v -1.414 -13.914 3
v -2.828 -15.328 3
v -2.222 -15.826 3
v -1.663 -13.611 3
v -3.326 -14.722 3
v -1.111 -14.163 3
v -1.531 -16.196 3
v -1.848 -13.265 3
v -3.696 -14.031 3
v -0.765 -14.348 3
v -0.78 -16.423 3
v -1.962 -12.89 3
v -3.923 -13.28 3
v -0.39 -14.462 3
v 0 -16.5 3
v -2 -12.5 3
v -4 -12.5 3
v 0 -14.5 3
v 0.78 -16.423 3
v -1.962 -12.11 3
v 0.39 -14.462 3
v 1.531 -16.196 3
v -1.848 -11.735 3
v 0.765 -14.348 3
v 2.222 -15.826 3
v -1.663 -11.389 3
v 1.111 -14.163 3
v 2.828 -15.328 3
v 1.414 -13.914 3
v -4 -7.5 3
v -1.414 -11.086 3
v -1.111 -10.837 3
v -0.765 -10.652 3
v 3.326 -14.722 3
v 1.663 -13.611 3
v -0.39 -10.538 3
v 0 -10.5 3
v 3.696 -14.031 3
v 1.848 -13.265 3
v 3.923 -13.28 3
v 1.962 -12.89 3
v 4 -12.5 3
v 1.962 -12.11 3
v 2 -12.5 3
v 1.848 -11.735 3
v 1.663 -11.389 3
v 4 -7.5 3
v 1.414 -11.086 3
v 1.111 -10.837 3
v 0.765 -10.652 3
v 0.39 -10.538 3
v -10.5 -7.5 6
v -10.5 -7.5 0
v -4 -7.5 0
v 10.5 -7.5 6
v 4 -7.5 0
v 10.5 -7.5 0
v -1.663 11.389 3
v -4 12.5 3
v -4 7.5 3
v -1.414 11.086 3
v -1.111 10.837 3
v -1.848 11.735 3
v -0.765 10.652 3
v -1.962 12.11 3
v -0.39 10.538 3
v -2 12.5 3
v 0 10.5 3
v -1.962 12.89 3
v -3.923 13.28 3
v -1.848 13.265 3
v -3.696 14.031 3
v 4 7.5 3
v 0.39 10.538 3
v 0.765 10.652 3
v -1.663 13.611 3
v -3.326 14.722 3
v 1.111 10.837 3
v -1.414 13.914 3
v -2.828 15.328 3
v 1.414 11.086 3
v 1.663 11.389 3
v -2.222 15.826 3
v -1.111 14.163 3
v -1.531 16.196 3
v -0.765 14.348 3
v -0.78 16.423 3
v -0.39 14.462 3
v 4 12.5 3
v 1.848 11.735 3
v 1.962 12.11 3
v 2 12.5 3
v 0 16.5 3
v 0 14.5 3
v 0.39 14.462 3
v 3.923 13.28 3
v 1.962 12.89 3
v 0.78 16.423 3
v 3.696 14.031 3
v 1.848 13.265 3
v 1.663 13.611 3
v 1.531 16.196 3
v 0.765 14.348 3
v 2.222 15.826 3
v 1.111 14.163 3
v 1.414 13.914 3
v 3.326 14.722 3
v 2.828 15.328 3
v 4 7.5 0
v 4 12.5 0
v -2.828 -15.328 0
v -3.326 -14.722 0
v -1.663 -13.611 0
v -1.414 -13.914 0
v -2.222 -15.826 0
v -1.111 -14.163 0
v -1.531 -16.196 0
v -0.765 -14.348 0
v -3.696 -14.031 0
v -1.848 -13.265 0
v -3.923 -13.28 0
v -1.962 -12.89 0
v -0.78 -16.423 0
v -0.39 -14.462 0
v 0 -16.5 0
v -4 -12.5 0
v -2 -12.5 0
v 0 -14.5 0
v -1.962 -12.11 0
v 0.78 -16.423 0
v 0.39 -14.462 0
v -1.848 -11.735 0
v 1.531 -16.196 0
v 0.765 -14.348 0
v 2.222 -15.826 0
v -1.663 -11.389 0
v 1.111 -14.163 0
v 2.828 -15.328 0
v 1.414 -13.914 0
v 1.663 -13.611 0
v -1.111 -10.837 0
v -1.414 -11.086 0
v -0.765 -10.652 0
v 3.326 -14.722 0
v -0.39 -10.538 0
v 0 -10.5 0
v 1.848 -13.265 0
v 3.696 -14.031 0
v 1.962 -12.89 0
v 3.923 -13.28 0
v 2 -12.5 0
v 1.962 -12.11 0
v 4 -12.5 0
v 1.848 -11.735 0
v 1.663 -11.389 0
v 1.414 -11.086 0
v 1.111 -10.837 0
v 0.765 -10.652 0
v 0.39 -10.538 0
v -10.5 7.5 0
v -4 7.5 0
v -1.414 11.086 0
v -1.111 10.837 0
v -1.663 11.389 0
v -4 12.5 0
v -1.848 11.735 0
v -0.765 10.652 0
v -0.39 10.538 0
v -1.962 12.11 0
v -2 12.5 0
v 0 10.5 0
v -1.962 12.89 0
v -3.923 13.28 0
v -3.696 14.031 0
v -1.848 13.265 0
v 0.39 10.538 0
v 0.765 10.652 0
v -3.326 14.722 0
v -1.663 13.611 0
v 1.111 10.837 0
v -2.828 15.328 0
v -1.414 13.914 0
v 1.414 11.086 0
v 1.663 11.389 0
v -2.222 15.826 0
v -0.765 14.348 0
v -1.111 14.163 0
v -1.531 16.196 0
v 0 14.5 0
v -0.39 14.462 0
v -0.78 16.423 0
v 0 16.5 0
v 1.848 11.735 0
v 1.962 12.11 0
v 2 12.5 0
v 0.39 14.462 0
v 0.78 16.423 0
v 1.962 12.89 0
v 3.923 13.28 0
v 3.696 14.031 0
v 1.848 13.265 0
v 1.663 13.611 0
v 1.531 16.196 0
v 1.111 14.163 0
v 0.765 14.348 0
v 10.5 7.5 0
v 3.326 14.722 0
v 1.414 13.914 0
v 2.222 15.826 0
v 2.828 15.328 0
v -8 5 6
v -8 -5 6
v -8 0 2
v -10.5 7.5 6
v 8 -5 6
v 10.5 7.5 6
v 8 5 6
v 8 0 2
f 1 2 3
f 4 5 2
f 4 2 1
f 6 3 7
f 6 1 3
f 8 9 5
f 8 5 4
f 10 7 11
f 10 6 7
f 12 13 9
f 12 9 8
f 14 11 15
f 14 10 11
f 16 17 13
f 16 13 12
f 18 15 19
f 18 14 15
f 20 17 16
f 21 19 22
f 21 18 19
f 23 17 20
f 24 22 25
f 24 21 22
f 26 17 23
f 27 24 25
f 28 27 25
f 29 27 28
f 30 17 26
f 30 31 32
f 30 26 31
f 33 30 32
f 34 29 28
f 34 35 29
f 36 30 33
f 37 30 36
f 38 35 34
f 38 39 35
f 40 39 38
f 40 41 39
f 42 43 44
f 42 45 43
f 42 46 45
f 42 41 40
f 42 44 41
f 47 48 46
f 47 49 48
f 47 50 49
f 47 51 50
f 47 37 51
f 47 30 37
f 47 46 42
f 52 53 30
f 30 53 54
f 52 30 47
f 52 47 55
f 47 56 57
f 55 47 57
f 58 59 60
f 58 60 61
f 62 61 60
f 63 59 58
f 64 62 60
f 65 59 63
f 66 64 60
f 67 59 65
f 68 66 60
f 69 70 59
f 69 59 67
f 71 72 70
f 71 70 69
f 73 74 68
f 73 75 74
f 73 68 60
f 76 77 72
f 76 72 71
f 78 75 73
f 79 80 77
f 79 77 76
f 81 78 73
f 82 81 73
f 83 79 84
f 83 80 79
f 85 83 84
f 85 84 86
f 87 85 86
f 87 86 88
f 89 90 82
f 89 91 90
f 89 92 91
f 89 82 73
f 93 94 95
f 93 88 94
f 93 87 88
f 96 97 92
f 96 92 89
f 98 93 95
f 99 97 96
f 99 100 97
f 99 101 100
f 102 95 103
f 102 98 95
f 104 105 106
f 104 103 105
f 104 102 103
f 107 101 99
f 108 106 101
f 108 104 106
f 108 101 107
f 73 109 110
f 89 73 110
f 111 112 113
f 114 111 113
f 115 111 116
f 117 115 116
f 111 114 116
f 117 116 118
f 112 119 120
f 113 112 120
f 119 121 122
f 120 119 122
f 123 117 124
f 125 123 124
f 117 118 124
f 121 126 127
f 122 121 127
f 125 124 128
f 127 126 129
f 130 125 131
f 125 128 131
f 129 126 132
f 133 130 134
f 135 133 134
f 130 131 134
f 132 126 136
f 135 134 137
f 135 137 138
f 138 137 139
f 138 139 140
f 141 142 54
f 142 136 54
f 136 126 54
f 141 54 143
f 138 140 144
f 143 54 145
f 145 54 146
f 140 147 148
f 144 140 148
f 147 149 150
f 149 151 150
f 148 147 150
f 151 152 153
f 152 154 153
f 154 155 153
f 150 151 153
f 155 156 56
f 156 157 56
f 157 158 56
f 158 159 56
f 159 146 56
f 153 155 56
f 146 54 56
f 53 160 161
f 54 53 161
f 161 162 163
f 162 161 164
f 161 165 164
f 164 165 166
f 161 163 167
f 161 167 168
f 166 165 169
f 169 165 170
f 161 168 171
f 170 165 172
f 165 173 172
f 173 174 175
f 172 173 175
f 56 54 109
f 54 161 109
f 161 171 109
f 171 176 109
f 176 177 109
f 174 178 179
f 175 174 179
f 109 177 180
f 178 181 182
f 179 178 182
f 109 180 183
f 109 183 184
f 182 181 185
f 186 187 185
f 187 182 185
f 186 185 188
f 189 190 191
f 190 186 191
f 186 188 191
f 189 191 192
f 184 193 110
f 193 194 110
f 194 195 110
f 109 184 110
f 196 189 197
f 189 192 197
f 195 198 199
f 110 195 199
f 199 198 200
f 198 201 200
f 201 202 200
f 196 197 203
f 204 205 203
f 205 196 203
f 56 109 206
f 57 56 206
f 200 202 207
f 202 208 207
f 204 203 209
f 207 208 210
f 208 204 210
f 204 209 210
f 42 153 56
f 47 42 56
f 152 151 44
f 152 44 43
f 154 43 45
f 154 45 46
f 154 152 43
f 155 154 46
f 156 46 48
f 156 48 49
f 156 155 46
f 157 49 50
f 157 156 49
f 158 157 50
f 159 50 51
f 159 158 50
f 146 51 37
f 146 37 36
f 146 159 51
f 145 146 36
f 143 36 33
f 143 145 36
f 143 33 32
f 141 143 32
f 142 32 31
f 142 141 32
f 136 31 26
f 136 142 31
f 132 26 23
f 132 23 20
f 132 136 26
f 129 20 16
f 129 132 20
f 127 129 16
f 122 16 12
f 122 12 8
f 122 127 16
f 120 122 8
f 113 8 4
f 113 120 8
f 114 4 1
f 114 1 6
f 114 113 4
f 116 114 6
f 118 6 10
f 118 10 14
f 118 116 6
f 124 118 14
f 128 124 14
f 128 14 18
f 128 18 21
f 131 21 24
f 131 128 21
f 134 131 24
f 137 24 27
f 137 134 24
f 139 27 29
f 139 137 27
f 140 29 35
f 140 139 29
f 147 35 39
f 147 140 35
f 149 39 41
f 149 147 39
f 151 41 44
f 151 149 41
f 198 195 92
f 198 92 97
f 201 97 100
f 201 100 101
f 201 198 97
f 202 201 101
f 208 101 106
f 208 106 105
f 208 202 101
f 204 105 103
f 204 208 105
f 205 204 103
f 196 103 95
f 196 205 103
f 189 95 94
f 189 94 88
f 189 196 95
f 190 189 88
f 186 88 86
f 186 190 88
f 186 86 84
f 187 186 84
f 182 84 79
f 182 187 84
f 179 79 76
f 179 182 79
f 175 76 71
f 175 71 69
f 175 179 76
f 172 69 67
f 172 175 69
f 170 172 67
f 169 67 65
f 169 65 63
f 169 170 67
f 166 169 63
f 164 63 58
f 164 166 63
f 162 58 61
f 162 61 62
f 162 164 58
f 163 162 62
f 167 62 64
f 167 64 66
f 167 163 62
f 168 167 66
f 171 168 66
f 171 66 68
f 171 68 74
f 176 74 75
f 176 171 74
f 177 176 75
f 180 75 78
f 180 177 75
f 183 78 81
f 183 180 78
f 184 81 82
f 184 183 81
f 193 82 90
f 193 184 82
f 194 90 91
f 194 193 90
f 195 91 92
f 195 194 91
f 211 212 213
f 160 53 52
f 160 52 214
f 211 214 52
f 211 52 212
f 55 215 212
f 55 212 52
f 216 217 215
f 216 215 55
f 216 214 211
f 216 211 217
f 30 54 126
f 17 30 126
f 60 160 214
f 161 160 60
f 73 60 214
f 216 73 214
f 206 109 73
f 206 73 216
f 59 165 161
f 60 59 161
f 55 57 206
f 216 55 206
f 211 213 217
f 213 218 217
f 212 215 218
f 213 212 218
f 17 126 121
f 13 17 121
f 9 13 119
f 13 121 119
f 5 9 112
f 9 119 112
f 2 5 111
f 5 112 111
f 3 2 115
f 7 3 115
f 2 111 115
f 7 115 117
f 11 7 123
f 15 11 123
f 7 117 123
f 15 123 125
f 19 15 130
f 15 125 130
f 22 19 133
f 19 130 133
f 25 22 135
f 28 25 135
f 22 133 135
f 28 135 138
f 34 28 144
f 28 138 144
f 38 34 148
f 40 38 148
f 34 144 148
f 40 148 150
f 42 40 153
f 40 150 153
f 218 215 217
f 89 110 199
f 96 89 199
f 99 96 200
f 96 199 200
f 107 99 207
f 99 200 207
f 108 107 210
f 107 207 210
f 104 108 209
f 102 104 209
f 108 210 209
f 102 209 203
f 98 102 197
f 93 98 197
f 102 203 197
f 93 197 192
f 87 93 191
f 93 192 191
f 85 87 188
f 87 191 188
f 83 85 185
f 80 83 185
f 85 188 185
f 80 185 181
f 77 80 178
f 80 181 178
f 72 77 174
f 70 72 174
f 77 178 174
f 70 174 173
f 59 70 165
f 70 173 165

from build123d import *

# Parameters (mm, degrees)
F0_W     = 21
F0_H     = 15
F1_DEPTH = 6
F3_DEPTH = 8
F4_R     = 2
F5_DEPTH = 3


with BuildPart() as f1:
    # F0 (on Top) → F1 (new body)
    with BuildSketch(Plane.XY):
        Rectangle(F0_W, F0_H)
    extrude(amount=F1_DEPTH)

    # F2 (on Right) → F3 (cut, symmetric)
    with BuildSketch(Plane.YZ):
        Polygon((5, 6), (-5, 6), (0, 2), align=None)
    extrude(amount=F3_DEPTH, both=True, mode=Mode.SUBTRACT)

    # F4 (on Top) → F5 (join)
    with BuildSketch(Plane.XY):
        with BuildLine():
            Line((-4, 12.5), (-4, 7.5))
            Line((-4, 7.5), (4, 7.5))
            Line((4, 7.5), (4, 12.5))
            ThreePointArc((4, 12.5), (0, 16.5), (-4, 12.5))
        make_face()
        with Locations((0, 12.5)):
            Circle(F4_R, mode=Mode.SUBTRACT)
        with BuildLine():
            Line((4, -7.5), (-4, -7.5))
            Line((-4, -7.5), (-4, -12.5))
            ThreePointArc((-4, -12.5), (0, -16.5), (4, -12.5))
            Line((4, -12.5), (4, -7.5))
        make_face()
        with Locations((0, -12.5)):
            Circle(F4_R, mode=Mode.SUBTRACT)
    extrude(amount=F5_DEPTH)


solid = f1.part
